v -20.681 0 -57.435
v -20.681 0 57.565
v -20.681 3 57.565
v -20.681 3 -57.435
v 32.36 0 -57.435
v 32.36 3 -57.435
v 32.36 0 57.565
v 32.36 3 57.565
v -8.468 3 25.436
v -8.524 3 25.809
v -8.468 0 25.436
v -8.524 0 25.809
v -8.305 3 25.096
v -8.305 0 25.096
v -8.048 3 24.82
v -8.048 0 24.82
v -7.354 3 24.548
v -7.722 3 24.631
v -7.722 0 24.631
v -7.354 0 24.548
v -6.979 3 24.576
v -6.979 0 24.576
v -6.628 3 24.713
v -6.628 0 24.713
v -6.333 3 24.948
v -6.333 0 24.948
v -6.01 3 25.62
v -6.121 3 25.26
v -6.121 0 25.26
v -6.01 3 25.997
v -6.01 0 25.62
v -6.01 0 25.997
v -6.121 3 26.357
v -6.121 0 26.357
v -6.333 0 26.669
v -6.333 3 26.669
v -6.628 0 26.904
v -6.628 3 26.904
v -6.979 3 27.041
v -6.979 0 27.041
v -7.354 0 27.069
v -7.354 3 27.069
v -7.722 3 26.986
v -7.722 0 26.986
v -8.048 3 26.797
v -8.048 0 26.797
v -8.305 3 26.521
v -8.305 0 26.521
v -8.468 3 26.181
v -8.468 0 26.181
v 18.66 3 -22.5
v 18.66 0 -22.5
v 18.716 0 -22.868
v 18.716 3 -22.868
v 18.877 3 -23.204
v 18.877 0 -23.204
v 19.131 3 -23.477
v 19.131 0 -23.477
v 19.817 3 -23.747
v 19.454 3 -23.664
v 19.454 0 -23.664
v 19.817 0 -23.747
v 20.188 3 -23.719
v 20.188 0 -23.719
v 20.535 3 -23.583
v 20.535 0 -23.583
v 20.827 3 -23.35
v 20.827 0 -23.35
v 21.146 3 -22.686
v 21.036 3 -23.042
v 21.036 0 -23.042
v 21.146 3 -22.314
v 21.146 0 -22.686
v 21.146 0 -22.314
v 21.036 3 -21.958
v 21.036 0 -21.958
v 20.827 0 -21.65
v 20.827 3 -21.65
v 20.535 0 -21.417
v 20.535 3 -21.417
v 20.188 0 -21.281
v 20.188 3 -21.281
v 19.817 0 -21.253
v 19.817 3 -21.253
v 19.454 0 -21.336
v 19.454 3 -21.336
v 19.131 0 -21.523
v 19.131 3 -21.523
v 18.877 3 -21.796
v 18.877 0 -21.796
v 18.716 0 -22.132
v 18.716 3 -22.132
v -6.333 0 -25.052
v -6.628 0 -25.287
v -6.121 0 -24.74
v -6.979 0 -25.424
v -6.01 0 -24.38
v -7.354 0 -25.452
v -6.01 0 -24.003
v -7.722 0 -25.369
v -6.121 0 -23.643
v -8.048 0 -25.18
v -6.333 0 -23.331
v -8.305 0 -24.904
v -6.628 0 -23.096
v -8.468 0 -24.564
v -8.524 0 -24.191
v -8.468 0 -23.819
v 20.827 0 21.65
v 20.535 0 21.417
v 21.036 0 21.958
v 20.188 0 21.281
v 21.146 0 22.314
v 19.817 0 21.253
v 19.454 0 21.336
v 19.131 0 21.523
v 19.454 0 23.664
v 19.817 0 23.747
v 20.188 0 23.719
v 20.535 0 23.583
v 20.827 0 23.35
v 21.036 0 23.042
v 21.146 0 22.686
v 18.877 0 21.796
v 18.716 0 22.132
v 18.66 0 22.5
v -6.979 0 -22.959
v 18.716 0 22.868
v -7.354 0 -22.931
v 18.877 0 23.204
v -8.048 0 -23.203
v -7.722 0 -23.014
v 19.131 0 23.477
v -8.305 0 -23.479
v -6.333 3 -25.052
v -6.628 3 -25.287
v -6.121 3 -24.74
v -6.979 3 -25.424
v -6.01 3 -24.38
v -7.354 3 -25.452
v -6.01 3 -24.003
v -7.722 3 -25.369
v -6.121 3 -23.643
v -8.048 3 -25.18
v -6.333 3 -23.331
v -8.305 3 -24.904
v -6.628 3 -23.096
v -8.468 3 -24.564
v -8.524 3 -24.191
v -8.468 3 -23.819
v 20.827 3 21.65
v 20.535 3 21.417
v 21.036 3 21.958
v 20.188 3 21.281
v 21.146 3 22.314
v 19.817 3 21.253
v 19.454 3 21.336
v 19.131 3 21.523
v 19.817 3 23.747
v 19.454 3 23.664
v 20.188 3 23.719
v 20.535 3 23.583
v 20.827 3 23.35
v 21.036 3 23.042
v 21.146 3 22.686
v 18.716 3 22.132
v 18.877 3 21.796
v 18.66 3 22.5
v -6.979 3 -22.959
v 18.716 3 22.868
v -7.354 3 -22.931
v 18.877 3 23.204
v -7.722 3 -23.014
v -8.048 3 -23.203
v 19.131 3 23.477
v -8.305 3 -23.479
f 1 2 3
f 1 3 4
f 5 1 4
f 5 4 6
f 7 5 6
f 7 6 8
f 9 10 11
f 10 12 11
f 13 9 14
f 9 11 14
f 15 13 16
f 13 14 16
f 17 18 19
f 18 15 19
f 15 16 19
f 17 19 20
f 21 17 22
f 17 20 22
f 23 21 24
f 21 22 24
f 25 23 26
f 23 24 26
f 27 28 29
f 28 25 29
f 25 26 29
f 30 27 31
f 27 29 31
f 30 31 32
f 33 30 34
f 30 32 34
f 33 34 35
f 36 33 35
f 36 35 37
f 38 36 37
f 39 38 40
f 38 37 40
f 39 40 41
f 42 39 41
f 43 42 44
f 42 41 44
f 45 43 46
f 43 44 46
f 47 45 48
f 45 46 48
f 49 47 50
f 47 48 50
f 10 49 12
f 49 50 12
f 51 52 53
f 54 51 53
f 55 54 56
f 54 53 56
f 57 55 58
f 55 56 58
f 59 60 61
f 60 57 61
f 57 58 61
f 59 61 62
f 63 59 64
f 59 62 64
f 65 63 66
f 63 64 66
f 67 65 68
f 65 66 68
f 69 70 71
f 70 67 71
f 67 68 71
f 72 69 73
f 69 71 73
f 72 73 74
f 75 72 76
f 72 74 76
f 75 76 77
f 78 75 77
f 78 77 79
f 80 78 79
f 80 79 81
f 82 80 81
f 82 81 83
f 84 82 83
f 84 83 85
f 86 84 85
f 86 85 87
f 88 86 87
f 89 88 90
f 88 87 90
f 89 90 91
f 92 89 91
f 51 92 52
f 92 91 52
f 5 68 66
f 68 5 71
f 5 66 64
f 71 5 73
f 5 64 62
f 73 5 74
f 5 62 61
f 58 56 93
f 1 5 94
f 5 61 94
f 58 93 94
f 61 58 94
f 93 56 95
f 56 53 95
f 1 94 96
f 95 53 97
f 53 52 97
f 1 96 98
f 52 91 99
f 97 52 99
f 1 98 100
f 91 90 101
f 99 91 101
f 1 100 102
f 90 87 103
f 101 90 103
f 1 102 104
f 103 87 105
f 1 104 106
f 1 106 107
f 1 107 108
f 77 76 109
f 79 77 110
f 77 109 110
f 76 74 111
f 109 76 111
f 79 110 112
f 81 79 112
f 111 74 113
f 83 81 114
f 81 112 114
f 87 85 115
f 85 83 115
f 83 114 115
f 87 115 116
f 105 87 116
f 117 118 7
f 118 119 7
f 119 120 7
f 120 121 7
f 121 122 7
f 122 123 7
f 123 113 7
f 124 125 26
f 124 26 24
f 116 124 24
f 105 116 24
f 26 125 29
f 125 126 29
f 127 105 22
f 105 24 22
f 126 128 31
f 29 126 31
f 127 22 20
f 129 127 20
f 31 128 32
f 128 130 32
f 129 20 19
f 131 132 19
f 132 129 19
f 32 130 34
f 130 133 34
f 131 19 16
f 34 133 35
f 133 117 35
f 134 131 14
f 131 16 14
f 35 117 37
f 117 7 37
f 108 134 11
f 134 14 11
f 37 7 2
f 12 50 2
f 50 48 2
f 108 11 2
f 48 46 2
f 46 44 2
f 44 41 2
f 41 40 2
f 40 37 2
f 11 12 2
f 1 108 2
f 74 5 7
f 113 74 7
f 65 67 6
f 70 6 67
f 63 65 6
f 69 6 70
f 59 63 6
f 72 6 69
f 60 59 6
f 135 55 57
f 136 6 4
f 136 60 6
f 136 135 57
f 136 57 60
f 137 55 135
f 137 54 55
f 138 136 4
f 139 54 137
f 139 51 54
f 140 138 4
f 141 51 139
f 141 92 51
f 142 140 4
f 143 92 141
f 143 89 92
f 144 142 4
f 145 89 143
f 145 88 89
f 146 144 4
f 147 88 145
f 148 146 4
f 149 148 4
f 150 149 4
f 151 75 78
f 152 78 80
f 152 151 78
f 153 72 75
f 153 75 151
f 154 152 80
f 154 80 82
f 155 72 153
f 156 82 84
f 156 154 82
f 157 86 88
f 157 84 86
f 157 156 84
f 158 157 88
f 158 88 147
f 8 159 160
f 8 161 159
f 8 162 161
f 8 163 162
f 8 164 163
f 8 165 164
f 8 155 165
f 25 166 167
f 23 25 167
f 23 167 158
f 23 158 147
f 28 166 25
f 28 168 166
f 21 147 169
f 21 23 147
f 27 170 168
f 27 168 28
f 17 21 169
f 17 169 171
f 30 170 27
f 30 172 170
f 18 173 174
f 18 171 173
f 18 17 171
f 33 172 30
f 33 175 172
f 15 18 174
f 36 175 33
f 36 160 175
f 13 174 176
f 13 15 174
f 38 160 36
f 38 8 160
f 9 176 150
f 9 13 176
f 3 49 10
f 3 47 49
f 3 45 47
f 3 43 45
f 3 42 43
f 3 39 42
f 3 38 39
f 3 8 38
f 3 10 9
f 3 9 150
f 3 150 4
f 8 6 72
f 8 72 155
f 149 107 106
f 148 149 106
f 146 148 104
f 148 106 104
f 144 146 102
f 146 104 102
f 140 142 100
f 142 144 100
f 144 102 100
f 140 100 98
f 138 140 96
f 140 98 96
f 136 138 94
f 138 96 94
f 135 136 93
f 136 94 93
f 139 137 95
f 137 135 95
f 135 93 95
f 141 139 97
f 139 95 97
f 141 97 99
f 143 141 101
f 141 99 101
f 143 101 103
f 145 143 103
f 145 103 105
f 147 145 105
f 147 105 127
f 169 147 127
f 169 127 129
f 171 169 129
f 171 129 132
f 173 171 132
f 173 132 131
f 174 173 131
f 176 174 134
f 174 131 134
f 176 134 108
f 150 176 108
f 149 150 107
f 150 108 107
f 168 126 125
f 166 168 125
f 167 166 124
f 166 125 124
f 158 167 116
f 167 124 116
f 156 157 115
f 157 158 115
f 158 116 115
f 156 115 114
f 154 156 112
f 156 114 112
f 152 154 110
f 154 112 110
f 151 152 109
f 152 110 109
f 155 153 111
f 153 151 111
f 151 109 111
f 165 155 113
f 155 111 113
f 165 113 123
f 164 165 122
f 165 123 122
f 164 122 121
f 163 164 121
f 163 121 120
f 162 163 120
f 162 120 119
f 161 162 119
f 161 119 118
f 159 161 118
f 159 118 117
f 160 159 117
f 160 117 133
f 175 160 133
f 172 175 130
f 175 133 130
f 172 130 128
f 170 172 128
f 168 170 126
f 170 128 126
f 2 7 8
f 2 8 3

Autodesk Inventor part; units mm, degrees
ref_plane "YZ Plane" through (0, 0, 0) normal (1, 0, 0) x (0, 1, 0)
ref_plane "XZ Plane" through (0, 0, 0) normal (0, 1, 0) x (-1, 0, 0)
ref_plane "XY Plane" through (0, 0, 0) normal (0, 0, 1) x (1, 0, 0)
sketch "Sketch1" plane through (0, 0, 0) normal (0, 1, 0) x (-1, 0, 0)
  spline S0 degree 3 poles (-32.404854, -32.853236) (-32.408213, -32.73595) (-32.409911, -32.618547) (-32.409934, -32.501343) (-32.409955, -32.397684) (-32.409974, -32.293904) (-32.409993, -32.190169) (-32.410033, -31.969146) (-32.41007, -31.748122) (-32.410103, -31.527098) (-32.41017, -31.085051) (-32.410223, -30.643004) (-32.410266, -30.200957) (-32.410352, -29.316862) (-32.410395, -28.432768) (-32.410416, -27.548673) (-32.410444, -26.388246) (-32.410435, -25.228046) (-32.410446, -24.067555) (-32.410451, -23.45976) (-32.410462, -22.851867) (-32.410477, -22.244105) (-32.410527, -20.157589) (-32.410619, -18.070753) (-32.410664, -15.984323) (-32.410696, -14.53452) (-32.410704, -13.084832) (-32.410706, -11.63497) (-32.410708, -10.42824) (-32.410705, -9.226696) (-32.410708, -8.025862) (-32.410715, -5.363664) (-32.410749, -2.704993) (-32.410749, 0) (-32.410749, 2.70077) (-32.410715, 5.359553) (-32.410708, 8.025862) (-32.410707, 8.544603) (-32.410707, 9.06363) (-32.410707, 9.583301) (-32.410707, 11.716216) (-32.41071, 13.850051) (-32.410664, 15.984323) (-32.410606, 18.679415) (-32.41047, 21.375766) (-32.410446, 24.067555) (-32.410425, 26.312694) (-32.410471, 28.55511) (-32.410201, 30.801569) (-32.410148, 31.243615) (-32.410083, 31.685661) (-32.410004, 32.127707) (-32.409982, 32.252247) (-32.409959, 32.376902) (-32.409934, 32.501343) (-32.409915, 32.59775) (-32.408764, 32.694267) (-32.406487, 32.790697) (-32.401273, 33.0116) (-32.390165, 33.232367) (-32.373199, 33.452997) (-32.339266, 33.894259) (-32.28153, 34.337158) (-32.200857, 34.773898) (-32.120183, 35.210638) (-32.017096, 35.639812) (-31.892023, 36.061563) (-31.803491, 36.360098) (-31.703903, 36.654969) (-31.593121, 36.94617) (-31.39089, 37.477752) (-31.151562, 37.997105) (-30.875182, 38.502046) (-30.760914, 38.710811) (-30.641216, 38.915391) (-30.516203, 39.115805) (-30.173207, 39.665673) (-29.790661, 40.184302) (-29.36895, 40.672553) (-29.245622, 40.81534) (-29.118935, 40.95548) (-28.988811, 41.092954) (-28.815373, 41.276189) (-28.635833, 41.454691) (-28.450153, 41.628366) (-28.125165, 41.932343) (-27.784487, 42.218481) (-27.432415, 42.483881) (-27.308772, 42.577086) (-27.18357, 42.667861) (-27.056809, 42.756201) (-26.46167, 43.170951) (-25.83254, 43.532746) (-25.16884, 43.840615) (-25.051477, 43.895056) (-24.933051, 43.94777) (-24.813786, 43.998631) (-24.523994, 44.122212) (-24.22923, 44.2348) (-23.933007, 44.33546) (-23.514871, 44.477546) (-23.091358, 44.596955) (-22.662502, 44.693838) (-22.570374, 44.714651) (-22.477996, 44.734419) (-22.38537, 44.753136) (-22.046825, 44.821544) (-21.70496, 44.875937) (-21.359741, 44.916201) (-20.920071, 44.967482) (-20.473811, 44.995783) (-20.027865, 45) knots 0 0 0 0 0.00414579 0.00414579 0.00414579 0.0078125 0.0078125 0.0078125 0.015625 0.015625 0.015625 0.03125 0.03125 0.03125 0.0625 0.0625 0.0625 0.1035175 0.1035175 0.1035175 0.125 0.125 0.125 0.19875187 0.19875187 0.19875187 0.25 0.25 0.25 0.29265414 0.29265414 0.29265414 0.38721651 0.38721651 0.38721651 0.48163124 0.48163124 0.48163124 0.5 0.5 0.5 0.57539191 0.57539191 0.57539191 0.67059447 0.67059447 0.67059447 0.75 0.75 0.75 0.765625 0.765625 0.765625 0.77002712 0.77002712 0.77002712 0.7734375 0.7734375 0.7734375 0.78125 0.78125 0.78125 0.796875 0.796875 0.796875 0.8125 0.8125 0.8125 0.82356007 0.82356007 0.82356007 0.84375 0.84375 0.84375 0.85209742 0.85209742 0.85209742 0.875 0.875 0.875 0.88169776 0.88169776 0.88169776 0.890625 0.890625 0.890625 0.90625 0.90625 0.90625 0.91173731 0.91173731 0.91173731 0.9375 0.9375 0.9375 0.94205566 0.94205566 0.94205566 0.953125 0.953125 0.953125 0.96875 0.96875 0.96875 0.97210662 0.97210662 0.97210662 0.984375 0.984375 0.984375 1 1 1 1
  spline S1 degree 3 poles (-28.410193, 32.5) (-28.410193, 33.765572) (-28.133676, 34.931308) (-27.671254, 35.965522) (-27.208832, 36.999736) (-26.560504, 37.902428) (-25.780808, 38.647111) (-25.001113, 39.391795) (-24.090049, 39.97847) (-23.095481, 40.380521) (-22.100912, 40.782573) (-21.02284, 41) (-19.910193, 41) (-18.797545, 41) (-17.719473, 40.782573) (-16.724904, 40.380521) (-15.730336, 39.97847) (-14.819272, 39.391795) (-14.039577, 38.647111) (-13.259881, 37.902428) (-12.611553, 36.999736) (-12.149131, 35.965522) (-11.686709, 34.931308) (-11.410193, 33.765572) (-11.410193, 32.5) knots 0 0 0 0 0.125 0.125 0.125 0.25 0.25 0.25 0.375 0.375 0.375 0.5 0.5 0.5 0.625 0.625 0.625 0.75 0.75 0.75 0.875 0.875 0.875 1 1 1 1
  line L0 (-28.410193, -32.5) -> (-28.410193, 32.5)
  line L1 (-11.410193, 32.5) -> (-11.410193, -9.130692)
  line L2 (-11.410193, -9.130692) -> (-11.410193, -32.5)
  spline S2 degree 3 poles (-11.92122, -35.403236) (-11.99101, -35.594681) (-12.067149, -35.782168) (-12.149131, -35.965522) (-12.611553, -36.999736) (-13.259881, -37.902428) (-14.039577, -38.647111) (-14.819272, -39.391795) (-15.730336, -39.97847) (-16.724904, -40.380521) (-17.719473, -40.782573) (-18.797545, -41) (-19.910193, -41) (-21.02284, -41) (-22.100912, -40.782573) (-23.095481, -40.380521) (-24.090049, -39.97847) (-25.001113, -39.391795) (-25.780808, -38.647111) (-26.560504, -37.902428) (-27.208832, -36.999736) (-27.671254, -35.965522) (-27.753236, -35.782168) (-27.829375, -35.594681) (-27.899165, -35.403236) knots 0.102839 0.102839 0.102839 0.102839 0.125 0.125 0.125 0.25 0.25 0.25 0.375 0.375 0.375 0.5 0.5 0.5 0.625 0.625 0.625 0.75 0.75 0.75 0.875 0.875 0.875 0.897161 0.897161 0.897161 0.897161
  ellipse E0 centre (-27.409985, -30.903735) end of major axis (-43.224744, -27.538991) minor radius 11.659046 (-11.885471, -35.303236) -> (-11.410193, -32.5) ccw
  ellipse E1 centre (-12.410416, -30.903738) end of major axis (-28.225158, -34.268479) minor radius 11.659041 (-28.410193, -32.5) -> (-27.934914, -35.303236) ccw
  spline S3 degree 3 poles (-20.135916, -44.926171) (-20.902232, -44.912188) (-21.656156, -44.828474) (-22.39639, -44.67772) (-22.948546, -44.56527) (-23.493405, -44.415278) (-24.031365, -44.226793) (-24.310103, -44.129132) (-24.58603, -44.021306) (-24.856048, -43.904514) (-24.890974, -43.889408) (-24.925802, -43.874152) (-24.960525, -43.858751) (-25.263696, -43.724284) (-25.560172, -43.578241) (-25.850131, -43.420931) (-26.291576, -43.181437) (-26.717955, -42.915946) (-27.128881, -42.623661) (-27.257781, -42.531977) (-27.385148, -42.437641) (-27.510974, -42.340653) (-27.774451, -42.137563) (-28.031837, -41.922148) (-28.278086, -41.698847) (-28.524335, -41.475546) (-28.760531, -41.243618) (-28.986777, -41.003148) (-29.015281, -40.972852) (-29.043627, -40.942419) (-29.071813, -40.911851) (-29.491074, -40.457166) (-29.875526, -39.972573) (-30.22442, -39.457475) (-30.348377, -39.274468) (-30.468123, -39.087073) (-30.582688, -38.896485) (-30.640191, -38.800823) (-30.696393, -38.704359) (-30.751212, -38.60729) (-30.915247, -38.316831) (-31.066945, -38.021018) (-31.206902, -37.720112) (-31.358831, -37.393466) (-31.497133, -37.060343) (-31.621381, -36.721723) (-31.726048, -36.436468) (-31.82072, -36.147348) (-31.905041, -35.853236) knots 0 0 0 0 0.14319106 0.14319106 0.14319106 0.25 0.25 0.25 0.30534172 0.30534172 0.30534172 0.3125 0.3125 0.3125 0.375 0.375 0.375 0.47015259 0.47015259 0.47015259 0.5 0.5 0.5 0.5625 0.5625 0.5625 0.625 0.625 0.625 0.63287425 0.63287425 0.63287425 0.75 0.75 0.75 0.7916132 0.7916132 0.7916132 0.8125 0.8125 0.8125 0.875 0.875 0.875 0.94284614 0.94284614 0.94284614 1 1 1 1
  ellipse E2 centre (-27.409985, -30.903735) end of major axis (-43.224744, -27.538991) minor radius 11.659046 (-11.885471, -35.303236) -> (-11.410193, -32.5) ccw
  line L3 (-11.410193, -9.130692) -> (-11.410193, -32.5)
  line L4 (-11.410193, 32.5) -> (-11.410193, -9.130692)
  spline S4 degree 3 poles (-28.410193, 32.5) (-28.410193, 33.765572) (-28.133677, 34.931308) (-27.671254, 35.965522) (-27.208832, 36.999736) (-26.560504, 37.902428) (-25.780809, 38.647111) (-25.001113, 39.391795) (-24.090049, 39.97847) (-23.095481, 40.380521) (-22.100913, 40.782573) (-21.02284, 41) (-19.910193, 41) (-18.797545, 41) (-17.719473, 40.782573) (-16.724904, 40.380521) (-15.730336, 39.97847) (-14.819273, 39.391795) (-14.039577, 38.647111) (-13.259881, 37.902428) (-12.611553, 36.999736) (-12.149131, 35.965522) (-11.686709, 34.931308) (-11.410193, 33.765572) (-11.410193, 32.5) knots 0 0 0 0 0.125 0.125 0.125 0.25 0.25 0.25 0.375 0.375 0.375 0.5 0.5 0.5 0.625 0.625 0.625 0.75 0.75 0.75 0.875 0.875 0.875 1 1 1 1
  line L5 (-28.410193, -32.5) -> (-28.410193, 32.5)
  ellipse E3 centre (-12.410416, -30.903738) end of major axis (-28.225158, -34.268479) minor radius 11.659041 (-28.410193, -32.5) -> (-27.934914, -35.303236) ccw
  circle A0 centre (-19.910193, 22.5) radius 1.25
  circle A1 centre (-19.910193, -22.5) radius 1.25
  spline S5 degree 3 poles (-7.409638, -8.902626) (-7.409642, -11.263271) (-7.409635, -13.623588) (-7.409688, -15.984285) (-7.409726, -17.615445) (-7.409792, -19.246809) (-7.409843, -20.877933) (-7.409877, -21.941017) (-7.409905, -23.004462) (-7.409916, -24.06752) (-7.409926, -25.000298) (-7.409923, -25.932787) (-7.409937, -26.865587) (-7.409952, -27.863529) (-7.409987, -28.861472) (-7.410072, -29.859414) (-7.410115, -30.358385) (-7.410171, -30.857356) (-7.410243, -31.356327) (-7.410279, -31.605813) (-7.410319, -31.855298) (-7.410363, -32.104784) (-7.410387, -32.236971) (-7.410411, -32.369257) (-7.410437, -32.501339) (-7.410461, -32.618544) (-7.412158, -32.735941) (-7.415518, -32.853236) knots 0 0 0 0 0.29568906 0.29568906 0.29568906 0.5 0.5 0.5 0.6331595 0.6331595 0.6331595 0.75 0.75 0.75 0.875 0.875 0.875 0.9375 0.9375 0.9375 0.96875 0.96875 0.96875 0.98530746 0.98530746 0.98530746 1 1 1 1
  spline S6 degree 3 poles (-7.409638, -8.902626) (-7.398668, -9.006825) (-9.14047, -8.698904) (-11.410193, -9.130692) knots 0 0 0 0 1 1 1 1
  line L6 (-11.410193, -9.130692) -> (-11.410193, -32.5)
  ellipse E4 centre (-27.409985, -30.903735) end of major axis (-43.224744, -27.538991) minor radius 11.659046 (-11.885471, -35.303236) -> (-11.410193, -32.5) ccw
  line L7 (-11.885471, -35.303236) -> (-7.757702, -35.303236)
  spline S7 degree 3 poles (-7.757702, -35.303236) (-7.758844, -35.303236) (-7.761073, -35.30773) (-7.767821, -35.325968) (-7.772438, -35.340145) (-7.78659, -35.386369) (-7.797308, -35.423345) (-7.823066, -35.51376) (-7.838041, -35.566981) (-7.866767, -35.668696) (-7.879817, -35.714794) (-7.897842, -35.778081) (-7.902464, -35.794277) (-7.90927, -35.818079) (-7.911434, -35.825641) (-7.915514, -35.839882) (-7.917428, -35.846559) (-7.919345, -35.853236) knots 0 0 0 0 0.13804482 0.13804482 0.28388387 0.28388387 0.50004609 0.50004609 0.72328448 0.72328448 0.89210226 0.89210226 0.94966157 0.94966157 0.97641027 0.97641027 1 1 1 1
  spline S8 degree 3 poles (-7.919345, -35.853236) (-8.003152, -36.145286) (-8.097043, -36.431979) (-8.200582, -36.714498) (-8.328208, -37.062745) (-8.47045, -37.404583) (-8.626747, -37.739075) (-8.810346, -38.131998) (-9.013716, -38.515699) (-9.237855, -38.889015) (-9.35932, -39.09132) (-9.486915, -39.290583) (-9.620818, -39.486955) (-9.811316, -39.766324) (-10.014117, -40.038912) (-10.225707, -40.300477) (-10.393712, -40.508163) (-10.567792, -40.709695) (-10.747887, -40.905165) (-10.794607, -40.955875) (-10.841734, -41.006176) (-10.889261, -41.056069) (-11.350717, -41.540498) (-11.849576, -41.987112) (-12.386918, -42.394816) (-12.486805, -42.470605) (-12.588167, -42.545124) (-12.690734, -42.618124) (-12.864047, -42.741476) (-13.040808, -42.860477) (-13.219487, -42.974259) (-13.503909, -43.155378) (-13.7942, -43.324035) (-14.090213, -43.480544) (-14.376118, -43.631709) (-14.667362, -43.771537) (-14.964004, -43.8999) (-15.281618, -44.037338) (-15.605429, -44.161639) (-15.935451, -44.272737) (-16.254577, -44.380167) (-16.581053, -44.475594) (-16.9089, -44.557066) (-17.080253, -44.599649) (-17.251997, -44.638463) (-17.424125, -44.673526) (-17.581326, -44.705549) (-17.738847, -44.734442) (-17.896686, -44.760264) (-18.558021, -44.868455) (-19.224843, -44.923373) (-19.897251, -44.924079) (-19.901566, -44.924083) (-19.90588, -44.924086) (-19.910193, -44.924086) (-20.241963, -44.924086) (-20.576611, -44.910627) (-20.909693, -44.883796) (-21.247106, -44.856615) (-21.5813, -44.815961) (-21.912343, -44.762119) (-22.074408, -44.73576) (-22.235717, -44.706233) (-22.39627, -44.673528) (-22.891627, -44.572622) (-23.379775, -44.441685) (-23.860799, -44.280846) (-24.196316, -44.16866) (-24.529506, -44.041364) (-24.856421, -43.899904) (-25.150109, -43.772821) (-25.438729, -43.634322) (-25.719775, -43.486069) (-26.209658, -43.227655) (-26.679695, -42.938431) (-27.129738, -42.618131) (-27.225287, -42.550128) (-27.319927, -42.480713) (-27.41366, -42.409893) (-27.948886, -42.0055) (-28.458682, -41.551215) (-28.922894, -41.064862) (-28.973321, -41.01203) (-29.02324, -40.9588) (-29.072649, -40.905176) (-29.478082, -40.465148) (-29.849491, -39.998649) (-30.186959, -39.505722) (-30.324635, -39.304624) (-30.456615, -39.099116) (-30.58276, -38.889029) (-30.630057, -38.810259) (-30.676532, -38.730845) (-30.722184, -38.6508) (-30.889595, -38.357265) (-31.045877, -38.05518) (-31.189193, -37.749189) (-31.347794, -37.410564) (-31.491558, -37.065293) (-31.620128, -36.714515) (-31.723916, -36.431349) (-31.817776, -36.144633) (-31.901409, -35.853236) knots 0 0 0 0 0.02799367 0.02799367 0.02799367 0.0625 0.0625 0.0625 0.10303401 0.10303401 0.10303401 0.125 0.125 0.125 0.15625 0.15625 0.15625 0.18106293 0.18106293 0.18106293 0.1875 0.1875 0.1875 0.25 0.25 0.25 0.26161819 0.26161819 0.26161819 0.28125 0.28125 0.28125 0.3125 0.3125 0.3125 0.34268303 0.34268303 0.34268303 0.375 0.375 0.375 0.40625 0.40625 0.40625 0.42258324 0.42258324 0.42258324 0.4375 0.4375 0.4375 0.5 0.5 0.5 0.50040103 0.50040103 0.50040103 0.53125 0.53125 0.53125 0.5625 0.5625 0.5625 0.57779868 0.57779868 0.57779868 0.625 0.625 0.625 0.65792316 0.65792316 0.65792316 0.6875 0.6875 0.6875 0.7390545 0.7390545 0.7390545 0.75 0.75 0.75 0.8125 0.8125 0.8125 0.81928929 0.81928929 0.81928929 0.875 0.875 0.875 0.89772826 0.89772826 0.89772826 0.90625 0.90625 0.90625 0.9375 0.9375 0.9375 0.97208291 0.97208291 0.97208291 1 1 1 1
  spline S9 degree 3 poles (-31.901409, -35.853236) (-31.903324, -35.846565) (-31.905236, -35.839895) (-31.909312, -35.82567) (-31.911474, -35.818117) (-31.918271, -35.79435) (-31.922886, -35.778181) (-31.940872, -35.715036) (-31.953892, -35.669047) (-31.982604, -35.567376) (-31.997591, -35.514102) (-32.023361, -35.423609) (-32.034081, -35.386601) (-32.048248, -35.340272) (-32.052873, -35.326045) (-32.05963, -35.307745) (-32.061857, -35.303236) (-32.062995, -35.303236) knots 0 0 0 0 0.02356692 0.02356692 0.05028405 0.05028405 0.10774901 0.10774901 0.27614786 0.27614786 0.49948807 0.49948807 0.71561552 0.71561552 0.86172473 0.86172473 1 1 1 1
  line L8 (-32.062995, -35.303236) -> (-27.934914, -35.303236)
  ellipse E5 centre (-12.410416, -30.903738) end of major axis (-28.225158, -34.268479) minor radius 11.659041 (-28.410193, -32.5) -> (-27.934914, -35.303236) ccw
  line L9 (-28.410193, -32.5) -> (-28.410193, 32.5)
  spline S10 degree 3 poles (-28.410193, 32.5) (-28.410193, 33.765572) (-28.133676, 34.931308) (-27.671254, 35.965522) (-27.208832, 36.999736) (-26.560504, 37.902428) (-25.780808, 38.647111) (-25.001113, 39.391795) (-24.090049, 39.97847) (-23.095481, 40.380521) (-22.100912, 40.782573) (-21.02284, 41) (-19.910193, 41) (-18.797545, 41) (-17.719473, 40.782573) (-16.724904, 40.380521) (-15.730336, 39.97847) (-14.819272, 39.391795) (-14.039577, 38.647111) (-13.259881, 37.902428) (-12.611553, 36.999736) (-12.149131, 35.965522) (-11.686709, 34.931308) (-11.410193, 33.765572) (-11.410193, 32.5) knots 0 0 0 0 0.125 0.125 0.125 0.25 0.25 0.25 0.375 0.375 0.375 0.5 0.5 0.5 0.625 0.625 0.625 0.75 0.75 0.75 0.875 0.875 0.875 1 1 1 1
  line L10 (-11.410193, 32.5) -> (-11.410193, -9.130692)
  spline S11 degree 3 poles (-7.409638, -8.902626) (-7.408932, -8.899194) (-7.41554, -8.881327) (-7.442844, -8.816766) (-7.463738, -8.769717) (-7.536437, -8.603714) (-7.599257, -8.458754) (-7.724577, -8.122213) (-7.786434, -7.935427) (-7.879306, -7.556662) (-7.913159, -7.371174) (-7.937278, -7.119769) (-7.941464, -7.06115) (-7.945382, -6.9757) (-7.946297, -6.949166) (-7.947438, -6.899489) (-7.947739, -6.876366) (-7.947807, -6.853236) knots 0 0 0 0 0.13056971 0.13056971 0.2645065 0.2645065 0.49982844 0.49982844 0.71627112 0.71627112 0.89885892 0.89885892 0.95382194 0.95382194 0.9785172 0.9785172 1 1 1 1
  spline S12 degree 3 poles (-7.947807, -6.853236) (-7.954633, -4.568884) (-7.957468, -2.286953) (-7.957468, 0) (-7.957468, 2.385018) (-7.954386, 4.76446) (-7.946908, 7.146764) knots 0 0 0 0 0.48950496 0.48950496 0.48950496 1 1 1 1
  spline S13 degree 3 poles (-7.946908, 7.146764) (-7.946835, 7.169899) (-7.946531, 7.193028) (-7.945383, 7.242716) (-7.944465, 7.269255) (-7.940538, 7.354723) (-7.936347, 7.413355) (-7.912212, 7.66482) (-7.878365, 7.850357) (-7.785562, 8.229172) (-7.723783, 8.415967) (-7.598689, 8.752471) (-7.536024, 8.897388) (-7.46354, 9.063319) (-7.442718, 9.110341) (-7.415511, 9.174866) (-7.408931, 9.192724) (-7.409638, 9.196154) knots 0 0 0 0 0.02148885 0.02148885 0.04619107 0.04619107 0.10116958 0.10116958 0.28381522 0.28381522 0.50028176 0.50028176 0.73556793 0.73556793 0.86946283 0.86946283 1 1 1 1
  ellipse E6 centre (-19.910191, 45) end of major axis (-20.032475, 45) minor radius 0 (-20.027865, 45) -> (-19.792521, 45) ccw
  spline S14 degree 3 poles (-32.404854, -32.853236) (-32.408213, -32.73595) (-32.409911, -32.618547) (-32.409934, -32.501343) (-32.409955, -32.397684) (-32.409974, -32.293904) (-32.409993, -32.190169) (-32.410033, -31.969146) (-32.41007, -31.748122) (-32.410103, -31.527098) (-32.41017, -31.085051) (-32.410223, -30.643004) (-32.410266, -30.200957) (-32.410352, -29.316862) (-32.410395, -28.432768) (-32.410416, -27.548673) (-32.410444, -26.388246) (-32.410435, -25.228046) (-32.410446, -24.067555) (-32.410451, -23.45976) (-32.410462, -22.851867) (-32.410477, -22.244105) (-32.410527, -20.157589) (-32.410619, -18.070753) (-32.410664, -15.984323) (-32.410696, -14.53452) (-32.410704, -13.084832) (-32.410706, -11.63497) (-32.410708, -10.42824) (-32.410705, -9.226696) (-32.410708, -8.025862) (-32.410715, -5.363664) (-32.410749, -2.704993) (-32.410749, 0) (-32.410749, 2.70077) (-32.410715, 5.359553) (-32.410708, 8.025862) (-32.410707, 8.544603) (-32.410707, 9.06363) (-32.410707, 9.583301) (-32.410707, 11.716216) (-32.41071, 13.850051) (-32.410664, 15.984323) (-32.410606, 18.679415) (-32.41047, 21.375766) (-32.410446, 24.067555) (-32.410425, 26.312694) (-32.410471, 28.55511) (-32.410201, 30.801569) (-32.410148, 31.243615) (-32.410083, 31.685661) (-32.410004, 32.127707) (-32.409982, 32.252247) (-32.409959, 32.376902) (-32.409934, 32.501343) (-32.409915, 32.59775) (-32.408764, 32.694267) (-32.406487, 32.790697) (-32.401273, 33.0116) (-32.390165, 33.232367) (-32.373199, 33.452997) (-32.339266, 33.894259) (-32.28153, 34.337158) (-32.200857, 34.773898) (-32.120183, 35.210638) (-32.017096, 35.639812) (-31.892023, 36.061563) (-31.803491, 36.360098) (-31.703903, 36.654969) (-31.593121, 36.94617) (-31.39089, 37.477752) (-31.151562, 37.997105) (-30.875182, 38.502046) (-30.760914, 38.710811) (-30.641216, 38.915391) (-30.516203, 39.115805) (-30.173207, 39.665673) (-29.790661, 40.184302) (-29.36895, 40.672553) (-29.245622, 40.81534) (-29.118935, 40.95548) (-28.988811, 41.092954) (-28.815373, 41.276189) (-28.635833, 41.454691) (-28.450153, 41.628366) (-28.125165, 41.932343) (-27.784487, 42.218481) (-27.432415, 42.483881) (-27.308772, 42.577086) (-27.18357, 42.667861) (-27.056809, 42.756201) (-26.46167, 43.170951) (-25.83254, 43.532746) (-25.16884, 43.840615) (-25.051477, 43.895056) (-24.933051, 43.94777) (-24.813786, 43.998631) (-24.523994, 44.122212) (-24.22923, 44.2348) (-23.933007, 44.33546) (-23.514871, 44.477546) (-23.091358, 44.596955) (-22.662502, 44.693838) (-22.570374, 44.714651) (-22.477996, 44.734419) (-22.38537, 44.753136) (-22.046825, 44.821544) (-21.70496, 44.875937) (-21.359741, 44.916201) (-20.920071, 44.967482) (-20.473811, 44.995783) (-20.027865, 45) knots 0 0 0 0 0.00414579 0.00414579 0.00414579 0.0078125 0.0078125 0.0078125 0.015625 0.015625 0.015625 0.03125 0.03125 0.03125 0.0625 0.0625 0.0625 0.1035175 0.1035175 0.1035175 0.125 0.125 0.125 0.19875187 0.19875187 0.19875187 0.25 0.25 0.25 0.29265414 0.29265414 0.29265414 0.38721651 0.38721651 0.38721651 0.48163124 0.48163124 0.48163124 0.5 0.5 0.5 0.57539191 0.57539191 0.57539191 0.67059447 0.67059447 0.67059447 0.75 0.75 0.75 0.765625 0.765625 0.765625 0.77002712 0.77002712 0.77002712 0.7734375 0.7734375 0.7734375 0.78125 0.78125 0.78125 0.796875 0.796875 0.796875 0.8125 0.8125 0.8125 0.82356007 0.82356007 0.82356007 0.84375 0.84375 0.84375 0.85209742 0.85209742 0.85209742 0.875 0.875 0.875 0.88169776 0.88169776 0.88169776 0.890625 0.890625 0.890625 0.90625 0.90625 0.90625 0.91173731 0.91173731 0.91173731 0.9375 0.9375 0.9375 0.94205566 0.94205566 0.94205566 0.953125 0.953125 0.953125 0.96875 0.96875 0.96875 0.97210662 0.97210662 0.97210662 0.984375 0.984375 0.984375 1 1 1 1
  spline S15 degree 3 poles (-32.326118, -33.903236) (-32.327007, -33.903236) (-32.328715, -33.895) (-32.333743, -33.861541) (-32.337123, -33.835589) (-32.347083, -33.749915) (-32.354346, -33.680402) (-32.369383, -33.51231) (-32.377025, -33.415241) (-32.389523, -33.2211) (-32.394565, -33.12798) (-32.399896, -33.000336) (-32.401115, -32.968405) (-32.402735, -32.921618) (-32.403222, -32.906877) (-32.404093, -32.879166) (-32.404483, -32.866202) (-32.404854, -32.853236) knots 0 0 0 0 0.13773636 0.13773636 0.28245528 0.28245528 0.4998262 0.4998262 0.71460149 0.71460149 0.89132086 0.89132086 0.94969153 0.94969153 0.97647884 0.97647884 1 1 1 1
  line L11 (-32.275001, -33.903236) -> (-32.326118, -33.903236)
  spline S16 degree 3 poles (-32.082303, -34.853236) (-32.084676, -34.841371) (-32.087042, -34.829506) (-32.09207, -34.804213) (-32.094728, -34.790789) (-32.103063, -34.748561) (-32.108688, -34.719844) (-32.130326, -34.608554) (-32.145652, -34.527896) (-32.178504, -34.352726) (-32.195119, -34.262366) (-32.224113, -34.107828) (-32.236352, -34.04447) (-32.25334, -33.965771) (-32.25917, -33.941768) (-32.268606, -33.91085) (-32.272281, -33.903236) (-32.275001, -33.903236) knots 0 0 0 0 0.02405151 0.02405151 0.0512956 0.0512956 0.10987642 0.10987642 0.27988487 0.27988487 0.49965886 0.49965886 0.71628377 0.71628377 0.86179308 0.86179308 1 1 1 1
  spline S17 degree 3 poles (-20.17139, -44.853236) (-20.878029, -44.838222) (-21.573226, -44.763643) (-22.257416, -44.631762) (-22.301762, -44.623215) (-22.346062, -44.614422) (-22.390317, -44.605384) (-23.028853, -44.474979) (-23.65793, -44.294096) (-24.276424, -44.061427) (-24.47081, -43.988301) (-24.66254, -43.910608) (-24.851638, -43.828396) (-25.305911, -43.630899) (-25.745054, -43.407502) (-26.16963, -43.159057) (-26.497285, -42.967327) (-26.816345, -42.760565) (-27.126353, -42.538413) (-27.385274, -42.35287) (-27.637877, -42.156573) (-27.883918, -41.949598) (-28.305343, -41.595087) (-28.698989, -41.216742) (-29.065485, -40.815445) (-29.16915, -40.701936) (-29.270623, -40.586577) (-29.369939, -40.469336) (-29.811526, -39.948054) (-30.211115, -39.389501) (-30.564084, -38.794047) (-30.571157, -38.782114) (-30.578212, -38.770167) (-30.585247, -38.758206) (-30.943356, -38.149318) (-31.244219, -37.518322) (-31.494339, -36.86773) (-31.525136, -36.787624) (-31.555162, -36.707173) (-31.584396, -36.626428) (-31.792589, -36.051387) (-31.960654, -35.461445) (-32.082303, -34.853236) knots 0 0 0 0 0.125 0.125 0.125 0.13310181 0.13310181 0.13310181 0.25 0.25 0.25 0.28673977 0.28673977 0.28673977 0.375 0.375 0.375 0.44311226 0.44311226 0.44311226 0.5 0.5 0.5 0.5974389 0.5974389 0.5974389 0.625 0.625 0.625 0.74754435 0.74754435 0.74754435 0.75 0.75 0.75 0.875 0.875 0.875 0.89039091 0.89039091 0.89039091 1 1 1 1
  line L12 (-20.17139, -44.853236) -> (-19.649008, -44.853236)
  spline S18 degree 3 poles (-7.738713, -34.853236) (-7.860311, -35.461404) (-8.028327, -36.051343) (-8.236488, -36.626409) (-8.265735, -36.707207) (-8.295776, -36.787711) (-8.326589, -36.867869) (-8.576705, -37.518543) (-8.877592, -38.149652) (-9.235782, -38.758677) (-9.242721, -38.770476) (-9.249678, -38.78226) (-9.256654, -38.79403) (-9.609761, -39.389781) (-10.009148, -39.948038) (-10.450617, -40.469231) (-10.549953, -40.586506) (-10.651446, -40.701897) (-10.755129, -40.815433) (-11.121335, -41.21644) (-11.514619, -41.594489) (-11.935591, -41.948716) (-12.181737, -42.155836) (-12.434737, -42.352496) (-12.69416, -42.538407) (-13.004032, -42.760472) (-13.323062, -42.967221) (-13.650378, -43.158779) (-14.075179, -43.40739) (-14.514473, -43.63087) (-14.9688, -43.828397) (-15.15761, -43.910486) (-15.349026, -43.988062) (-15.543071, -44.06108) (-16.161281, -44.293705) (-16.791217, -44.474918) (-17.430074, -44.605391) (-17.47426, -44.614415) (-17.518489, -44.623194) (-17.562759, -44.631729) (-18.247107, -44.763656) (-18.942379, -44.838234) (-19.649008, -44.853236) knots 0 0 0 0 0.10960083 0.10960083 0.10960083 0.125 0.125 0.125 0.25 0.25 0.25 0.25242164 0.25242164 0.25242164 0.375 0.375 0.375 0.4025818 0.4025818 0.4025818 0.5 0.5 0.5 0.55696145 0.55696145 0.55696145 0.625 0.625 0.625 0.71330281 0.71330281 0.71330281 0.75 0.75 0.75 0.86691377 0.86691377 0.86691377 0.875 0.875 0.875 1 1 1 1
  spline S19 degree 3 poles (-7.545928, -33.903236) (-7.548655, -33.903236) (-7.552333, -33.910824) (-7.561767, -33.941634) (-7.567592, -33.965551) (-7.584574, -34.044068) (-7.596815, -34.10737) (-7.625801, -34.261778) (-7.642403, -34.352049) (-7.675265, -34.527294) (-7.690621, -34.608135) (-7.712301, -34.719667) (-7.717932, -34.748431) (-7.726277, -34.790723) (-7.728938, -34.804162) (-7.733969, -34.829483) (-7.736337, -34.84136) (-7.738713, -34.853236) knots 0 0 0 0 0.13797105 0.13797105 0.28320611 0.28320611 0.49987241 0.49987241 0.71955484 0.71955484 0.88997298 0.88997298 0.94864929 0.94864929 0.97592532 0.97592532 1 1 1 1
  line L13 (-7.494451, -33.903236) -> (-7.545928, -33.903236)
  spline S20 degree 3 poles (-7.415518, -32.853236) (-7.415889, -32.866192) (-7.416279, -32.879146) (-7.417149, -32.906834) (-7.417636, -32.921561) (-7.419255, -32.968293) (-7.420473, -33.000185) (-7.425797, -33.127573) (-7.43083, -33.220493) (-7.443328, -33.414553) (-7.450985, -33.51171) (-7.466057, -33.679936) (-7.47334, -33.749507) (-7.483349, -33.835367) (-7.486752, -33.861406) (-7.491821, -33.894974) (-7.493547, -33.903236) (-7.494451, -33.903236) knots 0 0 0 0 0.02350348 0.02350348 0.05026558 0.05026558 0.10856122 0.10856122 0.28487722 0.28487722 0.49973499 0.49973499 0.71707093 0.71707093 0.86204486 0.86204486 1 1 1 1
  circle A2 centre (7.26, 25.808503) radius 1.2645
  circle A3 centre (7.26, -24.191497) radius 1.2645
  line L14 (14.52, 49.818503) -> (14.52, -48.201497)
  line L15 (14.52, -48.201497) -> (0, -48.201497)
  line L16 (0, -48.201497) -> (0, 49.818503)
  line L17 (0, 49.818503) -> (14.52, 49.818503)
  arc A4 (0.01, 54.808503) -> (-4.99, 49.808503) centre (0.01, 49.808503) ccw
  arc A5 (0.01, 54.808503) -> (-4.99, 49.808503) centre (0.01, 49.808503) ccw
  line L18 (-4.99, 49.808503) -> (-4.99, -48.191497)
  arc A6 (-4.99, -48.191497) -> (0.01, -53.191497) centre (0.01, -48.191497) ccw
  line L19 (0.01, -53.191497) -> (14.51, -53.191497)
  arc A7 (14.51, -53.191497) -> (19.51, -48.191497) centre (14.51, -48.191497) ccw
  line L20 (19.51, -48.191497) -> (19.51, 49.808503)
  arc A8 (19.51, 49.808503) -> (14.51, 54.808503) centre (14.51, 49.808503) ccw
  line L21 (14.51, 54.808503) -> (0.01, 54.808503)
  line L22 (0, 54.308503) -> (14.52, 54.308503)
  arc A9 (19.01, 49.818503) -> (14.52, 54.308503) centre (14.52, 49.818503) ccw
  line L23 (19.01, 49.818503) -> (19.01, -48.201497)
  arc A10 (14.52, -52.691497) -> (19.01, -48.201497) centre (14.52, -48.201497) ccw
  line L24 (14.52, -52.691497) -> (0, -52.691497)
  arc A11 (-4.49, -48.201497) -> (0, -52.691497) centre (0, -48.201497) ccw
  line L25 (-4.49, -48.201497) -> (-4.49, 49.818503)
  arc A12 (0, 54.308503) -> (-4.49, 49.818503) centre (0, 49.818503) ccw
  line L26 (-32.359548, 57.565226) -> (20.681148, 57.565226)
  line L27 (20.681148, 57.565226) -> (20.681148, -57.434774)
  line L28 (20.681148, -57.434774) -> (-32.359548, -57.434774)
  line L29 (-32.359548, -57.434774) -> (-32.359548, 57.565226)
  point P0 (0, 0)
  point P1 (-19.910193, 0)
  point P2 (6.940853, 0.065226)
  point P3 (2.640452, 0.065226)
  dimension "d1" = 115
sketch "Sketch1 outline for Extrusion1" plane through (0, 0, 0) normal (0, 1, 0) x (-1, 0, 0)
  line L0 (-32.359548, 57.565226) -> (20.681148, 57.565226)
  line L1 (-32.359548, -57.434774) -> (-32.359548, 57.565226)
  line L2 (20.681148, 57.565226) -> (20.681148, -57.434774)
  line L3 (20.681148, -57.434774) -> (-32.359548, -57.434774)
  circle A0 centre (-19.910193, -22.5) radius 1.25
  circle A1 centre (7.26, -24.191497) radius 1.2645
  circle A2 centre (-19.910193, 22.5) radius 1.25
  circle A3 centre (7.26, 25.808503) radius 1.2645
extrude "Extrusion1" add sketch "Sketch1 outline for Extrusion1" along normal blind 3
properties part number "realsenses_plate"
